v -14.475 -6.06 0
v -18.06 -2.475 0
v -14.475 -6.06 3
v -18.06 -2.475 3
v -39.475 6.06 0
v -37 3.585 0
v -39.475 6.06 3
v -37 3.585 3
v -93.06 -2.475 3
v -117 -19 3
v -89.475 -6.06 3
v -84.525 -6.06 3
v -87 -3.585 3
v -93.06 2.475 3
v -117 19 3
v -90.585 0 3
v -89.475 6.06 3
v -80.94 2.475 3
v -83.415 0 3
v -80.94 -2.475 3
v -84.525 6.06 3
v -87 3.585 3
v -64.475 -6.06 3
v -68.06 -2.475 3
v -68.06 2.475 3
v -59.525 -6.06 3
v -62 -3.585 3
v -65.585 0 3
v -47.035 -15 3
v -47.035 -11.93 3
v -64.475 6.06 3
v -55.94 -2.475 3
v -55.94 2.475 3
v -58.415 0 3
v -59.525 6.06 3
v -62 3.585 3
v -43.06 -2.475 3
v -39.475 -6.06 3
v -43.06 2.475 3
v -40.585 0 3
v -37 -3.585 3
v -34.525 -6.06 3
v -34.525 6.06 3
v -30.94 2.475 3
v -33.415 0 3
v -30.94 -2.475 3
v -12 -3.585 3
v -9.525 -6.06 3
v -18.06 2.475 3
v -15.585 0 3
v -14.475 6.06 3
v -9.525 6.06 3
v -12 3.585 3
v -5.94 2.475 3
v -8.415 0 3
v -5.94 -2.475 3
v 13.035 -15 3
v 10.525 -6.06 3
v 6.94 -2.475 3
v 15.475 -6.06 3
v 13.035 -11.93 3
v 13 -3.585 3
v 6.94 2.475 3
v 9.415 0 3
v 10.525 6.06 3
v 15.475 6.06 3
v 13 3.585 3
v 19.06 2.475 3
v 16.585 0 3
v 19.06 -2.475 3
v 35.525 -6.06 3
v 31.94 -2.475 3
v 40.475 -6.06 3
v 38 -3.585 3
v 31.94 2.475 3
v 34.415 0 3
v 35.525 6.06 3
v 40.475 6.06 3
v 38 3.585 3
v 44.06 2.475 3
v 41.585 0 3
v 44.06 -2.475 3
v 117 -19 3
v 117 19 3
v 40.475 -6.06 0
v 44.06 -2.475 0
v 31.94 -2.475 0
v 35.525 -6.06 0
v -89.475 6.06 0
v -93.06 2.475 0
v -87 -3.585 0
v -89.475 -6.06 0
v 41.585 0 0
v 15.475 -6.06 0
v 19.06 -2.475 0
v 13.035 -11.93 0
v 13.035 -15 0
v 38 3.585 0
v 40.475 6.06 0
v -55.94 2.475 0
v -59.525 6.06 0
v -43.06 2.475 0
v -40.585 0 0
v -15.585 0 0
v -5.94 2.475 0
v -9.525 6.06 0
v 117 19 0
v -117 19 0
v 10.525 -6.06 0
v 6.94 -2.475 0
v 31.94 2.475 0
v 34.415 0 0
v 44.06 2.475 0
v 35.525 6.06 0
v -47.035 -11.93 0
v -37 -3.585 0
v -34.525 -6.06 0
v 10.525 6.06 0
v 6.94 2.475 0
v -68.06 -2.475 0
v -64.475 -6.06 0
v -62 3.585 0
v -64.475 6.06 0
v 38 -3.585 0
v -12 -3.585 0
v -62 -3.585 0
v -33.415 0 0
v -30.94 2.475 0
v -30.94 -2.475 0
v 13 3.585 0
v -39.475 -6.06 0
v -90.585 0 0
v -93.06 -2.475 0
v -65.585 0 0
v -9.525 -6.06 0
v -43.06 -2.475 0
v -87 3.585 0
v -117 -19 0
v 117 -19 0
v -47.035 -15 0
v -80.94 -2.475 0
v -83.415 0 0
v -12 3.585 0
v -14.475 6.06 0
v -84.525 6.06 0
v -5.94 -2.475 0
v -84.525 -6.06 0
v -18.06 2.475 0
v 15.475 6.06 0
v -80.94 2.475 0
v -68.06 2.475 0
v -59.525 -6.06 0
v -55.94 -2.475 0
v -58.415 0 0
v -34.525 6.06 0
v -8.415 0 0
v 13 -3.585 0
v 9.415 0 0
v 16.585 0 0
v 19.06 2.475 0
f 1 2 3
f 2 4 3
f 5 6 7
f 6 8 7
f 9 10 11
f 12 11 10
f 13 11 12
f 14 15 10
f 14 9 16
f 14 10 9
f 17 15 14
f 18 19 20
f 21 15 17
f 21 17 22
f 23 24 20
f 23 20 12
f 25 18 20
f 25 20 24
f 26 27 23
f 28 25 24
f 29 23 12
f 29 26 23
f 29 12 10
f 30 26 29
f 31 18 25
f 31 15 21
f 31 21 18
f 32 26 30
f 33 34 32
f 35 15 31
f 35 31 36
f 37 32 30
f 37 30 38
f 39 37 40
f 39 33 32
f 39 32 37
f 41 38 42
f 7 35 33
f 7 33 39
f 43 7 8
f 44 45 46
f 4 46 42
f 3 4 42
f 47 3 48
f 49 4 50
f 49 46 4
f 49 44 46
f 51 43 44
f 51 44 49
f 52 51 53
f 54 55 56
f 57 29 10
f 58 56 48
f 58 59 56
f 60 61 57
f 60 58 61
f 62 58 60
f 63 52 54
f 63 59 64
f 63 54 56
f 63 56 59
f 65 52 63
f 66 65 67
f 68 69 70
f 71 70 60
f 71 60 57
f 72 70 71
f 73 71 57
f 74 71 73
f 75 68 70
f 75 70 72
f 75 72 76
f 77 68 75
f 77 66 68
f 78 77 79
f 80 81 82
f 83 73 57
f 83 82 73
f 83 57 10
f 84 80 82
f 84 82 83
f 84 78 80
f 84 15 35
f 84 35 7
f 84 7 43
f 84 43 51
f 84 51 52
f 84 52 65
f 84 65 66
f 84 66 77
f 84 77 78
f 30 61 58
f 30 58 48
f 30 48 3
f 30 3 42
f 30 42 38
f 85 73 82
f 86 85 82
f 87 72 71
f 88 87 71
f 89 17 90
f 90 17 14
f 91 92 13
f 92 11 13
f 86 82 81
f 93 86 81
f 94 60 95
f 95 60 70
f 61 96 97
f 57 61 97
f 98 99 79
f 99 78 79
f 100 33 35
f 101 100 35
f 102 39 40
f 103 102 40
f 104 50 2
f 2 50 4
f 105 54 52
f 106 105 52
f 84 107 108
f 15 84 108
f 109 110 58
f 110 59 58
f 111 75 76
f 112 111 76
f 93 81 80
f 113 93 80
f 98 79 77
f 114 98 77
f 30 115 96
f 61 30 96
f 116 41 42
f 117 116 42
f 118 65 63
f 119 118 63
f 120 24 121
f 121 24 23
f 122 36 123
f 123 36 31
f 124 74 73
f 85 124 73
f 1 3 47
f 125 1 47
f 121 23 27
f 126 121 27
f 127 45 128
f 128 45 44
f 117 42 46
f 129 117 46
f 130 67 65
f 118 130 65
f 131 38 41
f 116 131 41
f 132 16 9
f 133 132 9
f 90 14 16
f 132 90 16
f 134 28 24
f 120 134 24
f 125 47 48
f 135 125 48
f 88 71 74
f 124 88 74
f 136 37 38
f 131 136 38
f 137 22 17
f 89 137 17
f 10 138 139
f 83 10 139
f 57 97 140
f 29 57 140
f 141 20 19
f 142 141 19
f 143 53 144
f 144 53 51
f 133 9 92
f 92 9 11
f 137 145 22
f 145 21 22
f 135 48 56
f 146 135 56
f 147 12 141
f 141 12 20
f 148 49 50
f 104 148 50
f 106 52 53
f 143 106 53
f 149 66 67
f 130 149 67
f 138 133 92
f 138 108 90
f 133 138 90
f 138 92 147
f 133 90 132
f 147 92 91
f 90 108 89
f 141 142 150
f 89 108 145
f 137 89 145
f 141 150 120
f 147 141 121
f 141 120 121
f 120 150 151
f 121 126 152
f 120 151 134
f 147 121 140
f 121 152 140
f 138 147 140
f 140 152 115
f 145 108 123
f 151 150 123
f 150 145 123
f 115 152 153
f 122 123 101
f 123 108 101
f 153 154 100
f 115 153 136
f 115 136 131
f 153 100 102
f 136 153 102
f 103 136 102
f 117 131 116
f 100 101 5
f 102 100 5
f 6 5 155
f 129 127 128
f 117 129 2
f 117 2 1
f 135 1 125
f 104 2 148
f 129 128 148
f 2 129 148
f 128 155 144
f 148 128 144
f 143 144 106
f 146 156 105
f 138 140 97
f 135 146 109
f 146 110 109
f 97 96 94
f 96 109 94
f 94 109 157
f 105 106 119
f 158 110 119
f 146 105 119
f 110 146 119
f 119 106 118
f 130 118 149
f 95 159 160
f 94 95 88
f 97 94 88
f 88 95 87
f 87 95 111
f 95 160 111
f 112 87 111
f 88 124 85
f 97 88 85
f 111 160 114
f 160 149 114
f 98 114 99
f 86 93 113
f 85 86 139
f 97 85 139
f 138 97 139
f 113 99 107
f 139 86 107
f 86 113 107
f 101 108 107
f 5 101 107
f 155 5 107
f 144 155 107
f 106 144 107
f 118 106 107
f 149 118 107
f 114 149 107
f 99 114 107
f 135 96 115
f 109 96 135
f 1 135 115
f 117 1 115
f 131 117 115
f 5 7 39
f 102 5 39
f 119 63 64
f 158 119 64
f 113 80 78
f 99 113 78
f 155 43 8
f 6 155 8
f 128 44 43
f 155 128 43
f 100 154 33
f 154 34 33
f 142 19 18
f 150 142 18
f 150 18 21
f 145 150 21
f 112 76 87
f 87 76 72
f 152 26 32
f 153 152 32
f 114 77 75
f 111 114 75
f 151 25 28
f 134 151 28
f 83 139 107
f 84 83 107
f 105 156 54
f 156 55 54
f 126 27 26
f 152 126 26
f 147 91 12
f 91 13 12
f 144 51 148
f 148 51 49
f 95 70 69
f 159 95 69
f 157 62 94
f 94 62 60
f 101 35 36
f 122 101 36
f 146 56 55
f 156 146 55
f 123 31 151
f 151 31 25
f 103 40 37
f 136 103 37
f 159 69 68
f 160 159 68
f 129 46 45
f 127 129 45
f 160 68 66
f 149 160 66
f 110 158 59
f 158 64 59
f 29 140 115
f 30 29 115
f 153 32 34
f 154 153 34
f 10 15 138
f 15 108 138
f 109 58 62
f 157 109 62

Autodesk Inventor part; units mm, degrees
ref_plane "YZ Plane" through (0, 0, 0) normal (1, 0, 0) x (0, 1, 0)
ref_plane "XZ Plane" through (0, 0, 0) normal (0, 1, 0) x (-1, 0, 0)
ref_plane "XY Plane" through (0, 0, 0) normal (0, 0, 1) x (1, 0, 0)
sketch "Sketch1" plane through (0, 0, 0) normal (0, 0, 1) x (1, 0, 0)
  line L0 (-117, -19) -> (117, -19)
  line L1 (117, -19) -> (117, 19)
  line L2 (117, 19) -> (-117, 19)
  line L3 (-117, 19) -> (-117, -19)
  line L4 (-117, -19) -> (117, 19) construction
  line L5 (117, -19) -> (-117, 19) construction
  line L6 (-47.035, -11.93) -> (13.035, -11.93)
  line L7 (13.035, -11.93) -> (13.035, -15)
  line L8 (13.035, -15) -> (-47.035, -15)
  line L9 (-47.035, -15) -> (-47.035, -11.93)
  line L10 (-47.035, -11.93) -> (13.035, -15) construction
  line L11 (13.035, -11.93) -> (-47.035, -15) construction
  point P0 (0, 0)
  point P1 (-17, -13.465)
  dimension "d0" = 38
  dimension "d1" = 234
  dimension "d2" = 100
  dimension "d3" = 3.07
  dimension "d4" = 4
  dimension "d5" = 60.07
extrude "Plate1" add sketch "Sketch1" along normal blind 3
sketch "Sketch2" plane through (0, 0, 3) normal (0, 0, 1) x (1, 0, 0)
  line L0 (-84.5251, 6.0599) -> (-93.0599, -2.4749)
  line L1 (-93.0599, -2.4749) -> (-89.4749, -6.0599)
  line L2 (-89.4749, -6.0599) -> (-80.9401, 2.4749)
  line L3 (-80.9401, 2.4749) -> (-84.5251, 6.0599)
  line L4 (-89.4749, 6.0599) -> (-93.0599, 2.4749)
  line L5 (-93.0599, 2.4749) -> (-84.5251, -6.0599)
  line L6 (-84.5251, -6.0599) -> (-80.9401, -2.4749)
  line L7 (-80.9401, -2.4749) -> (-89.4749, 6.0599)
  line L8 (-82.7326, 4.2674) -> (-91.2674, -4.2674)
  line L9 (-91.2674, 4.2674) -> (-82.7326, -4.2674)
  line L10 (-117, 19) -> (-117, -19) projected
  line L11 (-117, 0) -> (0, 0)
  line L12 (-117, -19) -> (-117, 19) projected
  point P0 (-87, 0)
  point P1 (-87, -3.585)
  point P2 (-83.415, 0)
  point P3 (-87, 3.585)
  point P4 (-90.585, 0)
  dimension "d7" = 5.07
  dimension "d8" = 30
  dimension "d9" = 12.07
  dimension "d11" = 45
extrude "Cut1" cut sketch "Sketch2" against normal blind 3
pattern_linear "Rectangular Pattern1" count 6 spacing 25 along (1, 0, 0) of "Cut1"
equation "\"d12\" = Thickness"
equation "\"d6\" = Thickness"
equation "\"BendRadius\" = Thickness"
equation "\"BendReliefWidth\" = Thickness"
equation "\"BendReliefDepth\" = 0.5 * Thickness"
equation "\"CornerReliefSize\" = 4 * Thickness"
equation "\"MinimumRemnant\" = 2 * Thickness"
equation "\"TransitionRadius\" = BendRadius"
equation "\"JacobiRadiusSize\" = BendRadius"
equation "\"GapSize\" = Thickness"
equation "\"Thickness\" = 3"
properties part number "Extension .1"
